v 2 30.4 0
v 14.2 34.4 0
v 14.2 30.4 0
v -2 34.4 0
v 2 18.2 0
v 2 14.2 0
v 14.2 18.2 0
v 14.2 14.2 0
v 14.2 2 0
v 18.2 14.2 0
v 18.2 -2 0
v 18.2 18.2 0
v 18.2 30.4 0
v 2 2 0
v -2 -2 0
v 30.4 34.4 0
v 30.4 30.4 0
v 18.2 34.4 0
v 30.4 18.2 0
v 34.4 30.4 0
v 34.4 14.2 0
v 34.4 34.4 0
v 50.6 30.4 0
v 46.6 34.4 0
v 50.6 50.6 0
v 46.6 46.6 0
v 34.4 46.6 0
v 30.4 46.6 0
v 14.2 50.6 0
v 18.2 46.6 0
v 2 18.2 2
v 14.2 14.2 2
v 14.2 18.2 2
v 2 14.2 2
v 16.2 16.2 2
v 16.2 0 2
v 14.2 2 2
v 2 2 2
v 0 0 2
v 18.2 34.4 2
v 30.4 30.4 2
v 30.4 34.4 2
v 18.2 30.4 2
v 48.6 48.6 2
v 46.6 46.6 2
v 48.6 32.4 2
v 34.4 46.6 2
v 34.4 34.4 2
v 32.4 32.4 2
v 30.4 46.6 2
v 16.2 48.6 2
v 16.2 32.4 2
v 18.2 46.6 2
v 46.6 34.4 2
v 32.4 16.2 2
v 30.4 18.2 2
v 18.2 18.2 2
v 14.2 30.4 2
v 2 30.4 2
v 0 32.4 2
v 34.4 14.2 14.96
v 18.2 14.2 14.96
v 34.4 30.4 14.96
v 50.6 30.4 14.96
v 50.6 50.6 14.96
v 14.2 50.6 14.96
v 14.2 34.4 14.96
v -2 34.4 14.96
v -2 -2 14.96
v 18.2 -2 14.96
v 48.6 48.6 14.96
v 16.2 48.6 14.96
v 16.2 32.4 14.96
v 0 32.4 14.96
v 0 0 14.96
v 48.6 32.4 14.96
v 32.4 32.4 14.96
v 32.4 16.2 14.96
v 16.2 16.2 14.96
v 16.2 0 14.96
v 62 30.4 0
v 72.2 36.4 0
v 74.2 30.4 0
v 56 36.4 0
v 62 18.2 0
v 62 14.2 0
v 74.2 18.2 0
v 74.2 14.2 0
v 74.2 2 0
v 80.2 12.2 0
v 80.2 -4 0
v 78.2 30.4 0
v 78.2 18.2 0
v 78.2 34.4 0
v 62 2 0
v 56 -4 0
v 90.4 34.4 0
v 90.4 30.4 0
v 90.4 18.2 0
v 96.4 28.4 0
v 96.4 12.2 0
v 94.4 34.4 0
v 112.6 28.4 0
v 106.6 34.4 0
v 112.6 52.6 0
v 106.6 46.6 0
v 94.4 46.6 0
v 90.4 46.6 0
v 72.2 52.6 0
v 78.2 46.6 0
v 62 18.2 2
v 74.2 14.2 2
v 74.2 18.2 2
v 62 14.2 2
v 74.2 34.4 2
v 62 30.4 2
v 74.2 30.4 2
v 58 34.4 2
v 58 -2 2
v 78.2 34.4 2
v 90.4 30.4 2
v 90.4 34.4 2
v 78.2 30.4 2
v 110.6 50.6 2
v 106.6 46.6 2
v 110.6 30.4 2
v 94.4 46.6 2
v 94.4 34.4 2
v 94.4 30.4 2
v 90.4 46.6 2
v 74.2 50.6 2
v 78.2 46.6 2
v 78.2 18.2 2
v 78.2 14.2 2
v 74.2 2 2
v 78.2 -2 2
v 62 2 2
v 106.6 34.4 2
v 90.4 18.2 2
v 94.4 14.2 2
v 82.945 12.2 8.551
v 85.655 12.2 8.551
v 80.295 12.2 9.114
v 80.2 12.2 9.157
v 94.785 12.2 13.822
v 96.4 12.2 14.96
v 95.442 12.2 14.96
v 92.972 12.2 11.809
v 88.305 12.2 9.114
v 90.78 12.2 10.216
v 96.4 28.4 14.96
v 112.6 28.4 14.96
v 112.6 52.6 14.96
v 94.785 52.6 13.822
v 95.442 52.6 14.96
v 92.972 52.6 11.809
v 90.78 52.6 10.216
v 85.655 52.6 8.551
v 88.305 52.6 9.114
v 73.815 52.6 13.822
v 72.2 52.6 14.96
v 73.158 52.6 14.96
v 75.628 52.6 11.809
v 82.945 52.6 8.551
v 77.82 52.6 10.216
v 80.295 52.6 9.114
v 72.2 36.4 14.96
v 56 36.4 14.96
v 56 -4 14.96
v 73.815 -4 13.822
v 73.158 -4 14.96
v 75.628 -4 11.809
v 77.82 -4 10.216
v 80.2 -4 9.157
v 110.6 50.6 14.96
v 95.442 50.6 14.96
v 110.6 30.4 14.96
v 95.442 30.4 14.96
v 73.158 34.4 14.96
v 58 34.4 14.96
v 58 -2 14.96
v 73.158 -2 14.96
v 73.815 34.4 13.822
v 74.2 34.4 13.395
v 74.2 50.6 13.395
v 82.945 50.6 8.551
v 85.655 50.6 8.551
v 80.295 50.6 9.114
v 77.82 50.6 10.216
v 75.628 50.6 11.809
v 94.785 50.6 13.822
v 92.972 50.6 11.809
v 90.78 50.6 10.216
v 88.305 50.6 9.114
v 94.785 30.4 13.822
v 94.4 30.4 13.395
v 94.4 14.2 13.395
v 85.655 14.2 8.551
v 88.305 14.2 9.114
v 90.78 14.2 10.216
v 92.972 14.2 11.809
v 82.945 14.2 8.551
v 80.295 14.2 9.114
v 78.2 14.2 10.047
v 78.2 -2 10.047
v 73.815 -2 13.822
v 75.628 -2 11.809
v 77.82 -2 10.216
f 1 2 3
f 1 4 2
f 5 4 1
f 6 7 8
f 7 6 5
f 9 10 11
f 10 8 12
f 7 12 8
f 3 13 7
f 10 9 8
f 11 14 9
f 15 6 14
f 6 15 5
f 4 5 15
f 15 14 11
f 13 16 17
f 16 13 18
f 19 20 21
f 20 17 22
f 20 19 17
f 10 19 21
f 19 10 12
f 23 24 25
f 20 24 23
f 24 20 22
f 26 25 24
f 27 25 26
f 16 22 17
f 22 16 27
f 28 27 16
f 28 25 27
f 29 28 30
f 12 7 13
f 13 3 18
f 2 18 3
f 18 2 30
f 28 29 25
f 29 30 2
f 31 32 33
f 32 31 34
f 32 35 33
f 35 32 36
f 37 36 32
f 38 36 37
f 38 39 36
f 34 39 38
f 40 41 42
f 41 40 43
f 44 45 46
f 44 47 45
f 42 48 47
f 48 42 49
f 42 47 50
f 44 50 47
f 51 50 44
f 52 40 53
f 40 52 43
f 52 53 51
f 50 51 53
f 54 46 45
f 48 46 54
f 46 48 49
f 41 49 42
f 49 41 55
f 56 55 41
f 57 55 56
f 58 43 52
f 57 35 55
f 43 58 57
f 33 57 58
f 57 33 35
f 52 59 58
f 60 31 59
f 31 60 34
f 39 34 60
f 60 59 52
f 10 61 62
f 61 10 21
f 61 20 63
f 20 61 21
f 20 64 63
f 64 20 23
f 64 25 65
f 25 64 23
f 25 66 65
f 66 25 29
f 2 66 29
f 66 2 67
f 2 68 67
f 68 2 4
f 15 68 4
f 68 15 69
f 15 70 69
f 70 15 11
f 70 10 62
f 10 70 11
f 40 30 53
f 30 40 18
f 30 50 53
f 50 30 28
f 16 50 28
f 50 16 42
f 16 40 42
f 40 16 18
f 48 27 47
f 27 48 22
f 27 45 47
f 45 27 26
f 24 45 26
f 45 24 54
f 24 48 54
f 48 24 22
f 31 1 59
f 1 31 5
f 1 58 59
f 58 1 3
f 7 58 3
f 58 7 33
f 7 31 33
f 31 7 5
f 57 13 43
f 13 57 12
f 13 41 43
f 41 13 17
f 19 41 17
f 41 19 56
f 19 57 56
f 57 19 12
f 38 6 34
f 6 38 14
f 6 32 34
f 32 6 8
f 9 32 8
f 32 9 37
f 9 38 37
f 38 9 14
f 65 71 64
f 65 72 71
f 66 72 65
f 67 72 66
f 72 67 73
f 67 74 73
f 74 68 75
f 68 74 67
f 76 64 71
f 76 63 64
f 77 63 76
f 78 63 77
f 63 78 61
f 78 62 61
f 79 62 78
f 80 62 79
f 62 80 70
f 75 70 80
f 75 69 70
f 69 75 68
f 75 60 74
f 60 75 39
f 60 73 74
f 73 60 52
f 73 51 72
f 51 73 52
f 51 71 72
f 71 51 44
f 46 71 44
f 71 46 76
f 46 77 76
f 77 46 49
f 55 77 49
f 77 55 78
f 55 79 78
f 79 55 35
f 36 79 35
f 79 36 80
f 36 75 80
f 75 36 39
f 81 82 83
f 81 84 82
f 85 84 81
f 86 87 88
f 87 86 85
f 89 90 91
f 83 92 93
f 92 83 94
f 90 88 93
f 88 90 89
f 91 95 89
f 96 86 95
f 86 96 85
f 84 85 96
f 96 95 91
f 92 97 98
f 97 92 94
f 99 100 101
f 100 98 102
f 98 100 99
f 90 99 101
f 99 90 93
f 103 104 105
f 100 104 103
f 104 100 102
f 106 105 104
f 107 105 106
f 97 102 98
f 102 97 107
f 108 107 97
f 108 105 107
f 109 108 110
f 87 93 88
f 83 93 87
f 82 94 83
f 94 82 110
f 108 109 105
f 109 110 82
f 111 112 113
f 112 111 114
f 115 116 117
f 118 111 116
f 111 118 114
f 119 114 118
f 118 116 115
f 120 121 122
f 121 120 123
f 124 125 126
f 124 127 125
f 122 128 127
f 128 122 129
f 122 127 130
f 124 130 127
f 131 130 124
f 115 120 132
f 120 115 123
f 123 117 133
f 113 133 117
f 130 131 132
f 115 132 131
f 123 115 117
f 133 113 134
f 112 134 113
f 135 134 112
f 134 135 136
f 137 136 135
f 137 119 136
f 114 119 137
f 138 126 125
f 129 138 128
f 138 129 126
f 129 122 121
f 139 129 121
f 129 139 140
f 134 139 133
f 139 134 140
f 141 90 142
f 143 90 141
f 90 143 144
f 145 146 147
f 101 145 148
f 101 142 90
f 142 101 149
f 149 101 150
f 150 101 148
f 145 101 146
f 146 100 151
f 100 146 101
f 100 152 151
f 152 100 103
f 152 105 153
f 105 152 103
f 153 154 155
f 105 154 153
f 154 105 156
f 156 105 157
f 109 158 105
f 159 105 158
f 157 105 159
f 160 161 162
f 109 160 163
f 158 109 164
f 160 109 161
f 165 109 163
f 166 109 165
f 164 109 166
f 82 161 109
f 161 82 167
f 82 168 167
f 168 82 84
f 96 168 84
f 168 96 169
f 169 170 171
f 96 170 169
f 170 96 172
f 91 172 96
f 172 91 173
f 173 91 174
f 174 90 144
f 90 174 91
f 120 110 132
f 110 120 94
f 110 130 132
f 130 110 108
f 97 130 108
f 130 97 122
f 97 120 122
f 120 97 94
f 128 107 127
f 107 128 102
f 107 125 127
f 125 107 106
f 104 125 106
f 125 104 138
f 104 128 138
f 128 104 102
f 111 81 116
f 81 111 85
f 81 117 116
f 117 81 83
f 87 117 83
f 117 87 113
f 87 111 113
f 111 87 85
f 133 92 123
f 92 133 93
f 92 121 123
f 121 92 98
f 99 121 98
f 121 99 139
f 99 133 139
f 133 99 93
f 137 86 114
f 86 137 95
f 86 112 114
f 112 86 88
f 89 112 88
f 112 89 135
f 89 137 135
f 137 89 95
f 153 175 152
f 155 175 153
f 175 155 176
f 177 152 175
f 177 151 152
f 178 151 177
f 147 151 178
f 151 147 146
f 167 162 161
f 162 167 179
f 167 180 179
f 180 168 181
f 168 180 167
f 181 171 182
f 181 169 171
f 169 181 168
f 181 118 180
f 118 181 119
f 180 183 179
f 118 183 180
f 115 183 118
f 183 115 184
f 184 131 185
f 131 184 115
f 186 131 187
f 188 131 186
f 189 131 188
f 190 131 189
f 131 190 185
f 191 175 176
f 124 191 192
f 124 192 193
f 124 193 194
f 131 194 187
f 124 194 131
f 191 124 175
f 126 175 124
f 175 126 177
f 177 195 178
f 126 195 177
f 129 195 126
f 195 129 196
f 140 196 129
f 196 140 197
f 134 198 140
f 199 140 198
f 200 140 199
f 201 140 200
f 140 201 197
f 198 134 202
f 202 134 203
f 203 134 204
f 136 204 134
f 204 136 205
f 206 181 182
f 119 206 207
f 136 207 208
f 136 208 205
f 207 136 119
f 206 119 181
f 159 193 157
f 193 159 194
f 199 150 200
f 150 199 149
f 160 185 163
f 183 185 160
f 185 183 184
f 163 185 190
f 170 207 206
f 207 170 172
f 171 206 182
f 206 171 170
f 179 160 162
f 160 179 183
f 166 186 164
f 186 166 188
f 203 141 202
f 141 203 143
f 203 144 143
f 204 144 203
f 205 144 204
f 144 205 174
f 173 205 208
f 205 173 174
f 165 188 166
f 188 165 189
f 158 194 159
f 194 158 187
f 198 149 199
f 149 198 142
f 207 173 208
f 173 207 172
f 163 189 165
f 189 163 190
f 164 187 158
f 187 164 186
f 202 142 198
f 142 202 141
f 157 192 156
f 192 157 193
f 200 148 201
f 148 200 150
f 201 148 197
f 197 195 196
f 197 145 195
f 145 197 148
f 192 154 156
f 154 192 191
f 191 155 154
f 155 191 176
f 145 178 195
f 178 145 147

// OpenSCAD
// file: diceware.scad
mm = 1;

die_width = 16.2 * mm;
wall_width = 2 * mm;
wall_height = 0.8 * die_width;
window_border = 2 * mm;

module clamshell()
{
    linear_extrude(wall_width) difference()
    {
        offset(delta = wall_width) children(0);
        if ($children > 1)
        {
            children(1);
        }
    }

    translate([ 0, 0, wall_width ]) linear_extrude(wall_height) difference()
    {
        offset(delta = wall_width) children(0);
        children(0);
    }
}

module window()
{
    offset(delta = -window_border) scale(die_width) polygon([ [ 0, 0 ], [ 1, 0 ], [ 1, 1 ], [ 0, 1 ] ]);
}

module diceware_bottom()
{
    clamshell()
    {
        // Base
        children(0);
        // Base Cutouts
        children(1);
    }
}

module diceware_top()
{
    difference()
    {
        clamshell()
        {
            // Base
            offset(delta = wall_width) children(0);

            // Base Cutouts
            children(1);
        }
        // Wall Cutouts
        children(2);
    }
}
// main file
include <diceware.scad>

module zigzag_base()
{
    scale([ die_width, die_width ]) polygon([
        [ 0, 0 ],
        [ 1, 0 ],
        [ 1, 1 ],
        [ 2, 1 ],
        [ 2, 2 ],
        [ 3, 2 ],
        [ 3, 3 ],
        [ 1, 3 ],
        [ 1, 2 ],
        [ 0, 2 ],
    ]);
}

module zigzag_windows()
{
    for (x = [ [ 0, 0 ], [ 0, 1 ], [ 1, 1 ], [ 1, 2 ], [ 2, 2 ] ])
    {
        translate(die_width * x) window();
    }
}

module zigzag_bottom()
{
    diceware_bottom()
    {
        zigzag_base();
        zigzag_windows();
    }
}

module zigzag_top()
{
    diceware_top()
    {
        zigzag_base();
        zigzag_windows();

        translate([ 1.5 * die_width, -2 * wall_width - 0.1 * mm, wall_width + wall_height * 1.5 ]) rotate([ -90, 0, 0 ])
            cylinder(r = wall_height, h = 3 * die_width + 4 * wall_width + 0.2 * mm);
    }
}

zigzag_bottom();
translate([ 60, 0, 0 ]) zigzag_top();
